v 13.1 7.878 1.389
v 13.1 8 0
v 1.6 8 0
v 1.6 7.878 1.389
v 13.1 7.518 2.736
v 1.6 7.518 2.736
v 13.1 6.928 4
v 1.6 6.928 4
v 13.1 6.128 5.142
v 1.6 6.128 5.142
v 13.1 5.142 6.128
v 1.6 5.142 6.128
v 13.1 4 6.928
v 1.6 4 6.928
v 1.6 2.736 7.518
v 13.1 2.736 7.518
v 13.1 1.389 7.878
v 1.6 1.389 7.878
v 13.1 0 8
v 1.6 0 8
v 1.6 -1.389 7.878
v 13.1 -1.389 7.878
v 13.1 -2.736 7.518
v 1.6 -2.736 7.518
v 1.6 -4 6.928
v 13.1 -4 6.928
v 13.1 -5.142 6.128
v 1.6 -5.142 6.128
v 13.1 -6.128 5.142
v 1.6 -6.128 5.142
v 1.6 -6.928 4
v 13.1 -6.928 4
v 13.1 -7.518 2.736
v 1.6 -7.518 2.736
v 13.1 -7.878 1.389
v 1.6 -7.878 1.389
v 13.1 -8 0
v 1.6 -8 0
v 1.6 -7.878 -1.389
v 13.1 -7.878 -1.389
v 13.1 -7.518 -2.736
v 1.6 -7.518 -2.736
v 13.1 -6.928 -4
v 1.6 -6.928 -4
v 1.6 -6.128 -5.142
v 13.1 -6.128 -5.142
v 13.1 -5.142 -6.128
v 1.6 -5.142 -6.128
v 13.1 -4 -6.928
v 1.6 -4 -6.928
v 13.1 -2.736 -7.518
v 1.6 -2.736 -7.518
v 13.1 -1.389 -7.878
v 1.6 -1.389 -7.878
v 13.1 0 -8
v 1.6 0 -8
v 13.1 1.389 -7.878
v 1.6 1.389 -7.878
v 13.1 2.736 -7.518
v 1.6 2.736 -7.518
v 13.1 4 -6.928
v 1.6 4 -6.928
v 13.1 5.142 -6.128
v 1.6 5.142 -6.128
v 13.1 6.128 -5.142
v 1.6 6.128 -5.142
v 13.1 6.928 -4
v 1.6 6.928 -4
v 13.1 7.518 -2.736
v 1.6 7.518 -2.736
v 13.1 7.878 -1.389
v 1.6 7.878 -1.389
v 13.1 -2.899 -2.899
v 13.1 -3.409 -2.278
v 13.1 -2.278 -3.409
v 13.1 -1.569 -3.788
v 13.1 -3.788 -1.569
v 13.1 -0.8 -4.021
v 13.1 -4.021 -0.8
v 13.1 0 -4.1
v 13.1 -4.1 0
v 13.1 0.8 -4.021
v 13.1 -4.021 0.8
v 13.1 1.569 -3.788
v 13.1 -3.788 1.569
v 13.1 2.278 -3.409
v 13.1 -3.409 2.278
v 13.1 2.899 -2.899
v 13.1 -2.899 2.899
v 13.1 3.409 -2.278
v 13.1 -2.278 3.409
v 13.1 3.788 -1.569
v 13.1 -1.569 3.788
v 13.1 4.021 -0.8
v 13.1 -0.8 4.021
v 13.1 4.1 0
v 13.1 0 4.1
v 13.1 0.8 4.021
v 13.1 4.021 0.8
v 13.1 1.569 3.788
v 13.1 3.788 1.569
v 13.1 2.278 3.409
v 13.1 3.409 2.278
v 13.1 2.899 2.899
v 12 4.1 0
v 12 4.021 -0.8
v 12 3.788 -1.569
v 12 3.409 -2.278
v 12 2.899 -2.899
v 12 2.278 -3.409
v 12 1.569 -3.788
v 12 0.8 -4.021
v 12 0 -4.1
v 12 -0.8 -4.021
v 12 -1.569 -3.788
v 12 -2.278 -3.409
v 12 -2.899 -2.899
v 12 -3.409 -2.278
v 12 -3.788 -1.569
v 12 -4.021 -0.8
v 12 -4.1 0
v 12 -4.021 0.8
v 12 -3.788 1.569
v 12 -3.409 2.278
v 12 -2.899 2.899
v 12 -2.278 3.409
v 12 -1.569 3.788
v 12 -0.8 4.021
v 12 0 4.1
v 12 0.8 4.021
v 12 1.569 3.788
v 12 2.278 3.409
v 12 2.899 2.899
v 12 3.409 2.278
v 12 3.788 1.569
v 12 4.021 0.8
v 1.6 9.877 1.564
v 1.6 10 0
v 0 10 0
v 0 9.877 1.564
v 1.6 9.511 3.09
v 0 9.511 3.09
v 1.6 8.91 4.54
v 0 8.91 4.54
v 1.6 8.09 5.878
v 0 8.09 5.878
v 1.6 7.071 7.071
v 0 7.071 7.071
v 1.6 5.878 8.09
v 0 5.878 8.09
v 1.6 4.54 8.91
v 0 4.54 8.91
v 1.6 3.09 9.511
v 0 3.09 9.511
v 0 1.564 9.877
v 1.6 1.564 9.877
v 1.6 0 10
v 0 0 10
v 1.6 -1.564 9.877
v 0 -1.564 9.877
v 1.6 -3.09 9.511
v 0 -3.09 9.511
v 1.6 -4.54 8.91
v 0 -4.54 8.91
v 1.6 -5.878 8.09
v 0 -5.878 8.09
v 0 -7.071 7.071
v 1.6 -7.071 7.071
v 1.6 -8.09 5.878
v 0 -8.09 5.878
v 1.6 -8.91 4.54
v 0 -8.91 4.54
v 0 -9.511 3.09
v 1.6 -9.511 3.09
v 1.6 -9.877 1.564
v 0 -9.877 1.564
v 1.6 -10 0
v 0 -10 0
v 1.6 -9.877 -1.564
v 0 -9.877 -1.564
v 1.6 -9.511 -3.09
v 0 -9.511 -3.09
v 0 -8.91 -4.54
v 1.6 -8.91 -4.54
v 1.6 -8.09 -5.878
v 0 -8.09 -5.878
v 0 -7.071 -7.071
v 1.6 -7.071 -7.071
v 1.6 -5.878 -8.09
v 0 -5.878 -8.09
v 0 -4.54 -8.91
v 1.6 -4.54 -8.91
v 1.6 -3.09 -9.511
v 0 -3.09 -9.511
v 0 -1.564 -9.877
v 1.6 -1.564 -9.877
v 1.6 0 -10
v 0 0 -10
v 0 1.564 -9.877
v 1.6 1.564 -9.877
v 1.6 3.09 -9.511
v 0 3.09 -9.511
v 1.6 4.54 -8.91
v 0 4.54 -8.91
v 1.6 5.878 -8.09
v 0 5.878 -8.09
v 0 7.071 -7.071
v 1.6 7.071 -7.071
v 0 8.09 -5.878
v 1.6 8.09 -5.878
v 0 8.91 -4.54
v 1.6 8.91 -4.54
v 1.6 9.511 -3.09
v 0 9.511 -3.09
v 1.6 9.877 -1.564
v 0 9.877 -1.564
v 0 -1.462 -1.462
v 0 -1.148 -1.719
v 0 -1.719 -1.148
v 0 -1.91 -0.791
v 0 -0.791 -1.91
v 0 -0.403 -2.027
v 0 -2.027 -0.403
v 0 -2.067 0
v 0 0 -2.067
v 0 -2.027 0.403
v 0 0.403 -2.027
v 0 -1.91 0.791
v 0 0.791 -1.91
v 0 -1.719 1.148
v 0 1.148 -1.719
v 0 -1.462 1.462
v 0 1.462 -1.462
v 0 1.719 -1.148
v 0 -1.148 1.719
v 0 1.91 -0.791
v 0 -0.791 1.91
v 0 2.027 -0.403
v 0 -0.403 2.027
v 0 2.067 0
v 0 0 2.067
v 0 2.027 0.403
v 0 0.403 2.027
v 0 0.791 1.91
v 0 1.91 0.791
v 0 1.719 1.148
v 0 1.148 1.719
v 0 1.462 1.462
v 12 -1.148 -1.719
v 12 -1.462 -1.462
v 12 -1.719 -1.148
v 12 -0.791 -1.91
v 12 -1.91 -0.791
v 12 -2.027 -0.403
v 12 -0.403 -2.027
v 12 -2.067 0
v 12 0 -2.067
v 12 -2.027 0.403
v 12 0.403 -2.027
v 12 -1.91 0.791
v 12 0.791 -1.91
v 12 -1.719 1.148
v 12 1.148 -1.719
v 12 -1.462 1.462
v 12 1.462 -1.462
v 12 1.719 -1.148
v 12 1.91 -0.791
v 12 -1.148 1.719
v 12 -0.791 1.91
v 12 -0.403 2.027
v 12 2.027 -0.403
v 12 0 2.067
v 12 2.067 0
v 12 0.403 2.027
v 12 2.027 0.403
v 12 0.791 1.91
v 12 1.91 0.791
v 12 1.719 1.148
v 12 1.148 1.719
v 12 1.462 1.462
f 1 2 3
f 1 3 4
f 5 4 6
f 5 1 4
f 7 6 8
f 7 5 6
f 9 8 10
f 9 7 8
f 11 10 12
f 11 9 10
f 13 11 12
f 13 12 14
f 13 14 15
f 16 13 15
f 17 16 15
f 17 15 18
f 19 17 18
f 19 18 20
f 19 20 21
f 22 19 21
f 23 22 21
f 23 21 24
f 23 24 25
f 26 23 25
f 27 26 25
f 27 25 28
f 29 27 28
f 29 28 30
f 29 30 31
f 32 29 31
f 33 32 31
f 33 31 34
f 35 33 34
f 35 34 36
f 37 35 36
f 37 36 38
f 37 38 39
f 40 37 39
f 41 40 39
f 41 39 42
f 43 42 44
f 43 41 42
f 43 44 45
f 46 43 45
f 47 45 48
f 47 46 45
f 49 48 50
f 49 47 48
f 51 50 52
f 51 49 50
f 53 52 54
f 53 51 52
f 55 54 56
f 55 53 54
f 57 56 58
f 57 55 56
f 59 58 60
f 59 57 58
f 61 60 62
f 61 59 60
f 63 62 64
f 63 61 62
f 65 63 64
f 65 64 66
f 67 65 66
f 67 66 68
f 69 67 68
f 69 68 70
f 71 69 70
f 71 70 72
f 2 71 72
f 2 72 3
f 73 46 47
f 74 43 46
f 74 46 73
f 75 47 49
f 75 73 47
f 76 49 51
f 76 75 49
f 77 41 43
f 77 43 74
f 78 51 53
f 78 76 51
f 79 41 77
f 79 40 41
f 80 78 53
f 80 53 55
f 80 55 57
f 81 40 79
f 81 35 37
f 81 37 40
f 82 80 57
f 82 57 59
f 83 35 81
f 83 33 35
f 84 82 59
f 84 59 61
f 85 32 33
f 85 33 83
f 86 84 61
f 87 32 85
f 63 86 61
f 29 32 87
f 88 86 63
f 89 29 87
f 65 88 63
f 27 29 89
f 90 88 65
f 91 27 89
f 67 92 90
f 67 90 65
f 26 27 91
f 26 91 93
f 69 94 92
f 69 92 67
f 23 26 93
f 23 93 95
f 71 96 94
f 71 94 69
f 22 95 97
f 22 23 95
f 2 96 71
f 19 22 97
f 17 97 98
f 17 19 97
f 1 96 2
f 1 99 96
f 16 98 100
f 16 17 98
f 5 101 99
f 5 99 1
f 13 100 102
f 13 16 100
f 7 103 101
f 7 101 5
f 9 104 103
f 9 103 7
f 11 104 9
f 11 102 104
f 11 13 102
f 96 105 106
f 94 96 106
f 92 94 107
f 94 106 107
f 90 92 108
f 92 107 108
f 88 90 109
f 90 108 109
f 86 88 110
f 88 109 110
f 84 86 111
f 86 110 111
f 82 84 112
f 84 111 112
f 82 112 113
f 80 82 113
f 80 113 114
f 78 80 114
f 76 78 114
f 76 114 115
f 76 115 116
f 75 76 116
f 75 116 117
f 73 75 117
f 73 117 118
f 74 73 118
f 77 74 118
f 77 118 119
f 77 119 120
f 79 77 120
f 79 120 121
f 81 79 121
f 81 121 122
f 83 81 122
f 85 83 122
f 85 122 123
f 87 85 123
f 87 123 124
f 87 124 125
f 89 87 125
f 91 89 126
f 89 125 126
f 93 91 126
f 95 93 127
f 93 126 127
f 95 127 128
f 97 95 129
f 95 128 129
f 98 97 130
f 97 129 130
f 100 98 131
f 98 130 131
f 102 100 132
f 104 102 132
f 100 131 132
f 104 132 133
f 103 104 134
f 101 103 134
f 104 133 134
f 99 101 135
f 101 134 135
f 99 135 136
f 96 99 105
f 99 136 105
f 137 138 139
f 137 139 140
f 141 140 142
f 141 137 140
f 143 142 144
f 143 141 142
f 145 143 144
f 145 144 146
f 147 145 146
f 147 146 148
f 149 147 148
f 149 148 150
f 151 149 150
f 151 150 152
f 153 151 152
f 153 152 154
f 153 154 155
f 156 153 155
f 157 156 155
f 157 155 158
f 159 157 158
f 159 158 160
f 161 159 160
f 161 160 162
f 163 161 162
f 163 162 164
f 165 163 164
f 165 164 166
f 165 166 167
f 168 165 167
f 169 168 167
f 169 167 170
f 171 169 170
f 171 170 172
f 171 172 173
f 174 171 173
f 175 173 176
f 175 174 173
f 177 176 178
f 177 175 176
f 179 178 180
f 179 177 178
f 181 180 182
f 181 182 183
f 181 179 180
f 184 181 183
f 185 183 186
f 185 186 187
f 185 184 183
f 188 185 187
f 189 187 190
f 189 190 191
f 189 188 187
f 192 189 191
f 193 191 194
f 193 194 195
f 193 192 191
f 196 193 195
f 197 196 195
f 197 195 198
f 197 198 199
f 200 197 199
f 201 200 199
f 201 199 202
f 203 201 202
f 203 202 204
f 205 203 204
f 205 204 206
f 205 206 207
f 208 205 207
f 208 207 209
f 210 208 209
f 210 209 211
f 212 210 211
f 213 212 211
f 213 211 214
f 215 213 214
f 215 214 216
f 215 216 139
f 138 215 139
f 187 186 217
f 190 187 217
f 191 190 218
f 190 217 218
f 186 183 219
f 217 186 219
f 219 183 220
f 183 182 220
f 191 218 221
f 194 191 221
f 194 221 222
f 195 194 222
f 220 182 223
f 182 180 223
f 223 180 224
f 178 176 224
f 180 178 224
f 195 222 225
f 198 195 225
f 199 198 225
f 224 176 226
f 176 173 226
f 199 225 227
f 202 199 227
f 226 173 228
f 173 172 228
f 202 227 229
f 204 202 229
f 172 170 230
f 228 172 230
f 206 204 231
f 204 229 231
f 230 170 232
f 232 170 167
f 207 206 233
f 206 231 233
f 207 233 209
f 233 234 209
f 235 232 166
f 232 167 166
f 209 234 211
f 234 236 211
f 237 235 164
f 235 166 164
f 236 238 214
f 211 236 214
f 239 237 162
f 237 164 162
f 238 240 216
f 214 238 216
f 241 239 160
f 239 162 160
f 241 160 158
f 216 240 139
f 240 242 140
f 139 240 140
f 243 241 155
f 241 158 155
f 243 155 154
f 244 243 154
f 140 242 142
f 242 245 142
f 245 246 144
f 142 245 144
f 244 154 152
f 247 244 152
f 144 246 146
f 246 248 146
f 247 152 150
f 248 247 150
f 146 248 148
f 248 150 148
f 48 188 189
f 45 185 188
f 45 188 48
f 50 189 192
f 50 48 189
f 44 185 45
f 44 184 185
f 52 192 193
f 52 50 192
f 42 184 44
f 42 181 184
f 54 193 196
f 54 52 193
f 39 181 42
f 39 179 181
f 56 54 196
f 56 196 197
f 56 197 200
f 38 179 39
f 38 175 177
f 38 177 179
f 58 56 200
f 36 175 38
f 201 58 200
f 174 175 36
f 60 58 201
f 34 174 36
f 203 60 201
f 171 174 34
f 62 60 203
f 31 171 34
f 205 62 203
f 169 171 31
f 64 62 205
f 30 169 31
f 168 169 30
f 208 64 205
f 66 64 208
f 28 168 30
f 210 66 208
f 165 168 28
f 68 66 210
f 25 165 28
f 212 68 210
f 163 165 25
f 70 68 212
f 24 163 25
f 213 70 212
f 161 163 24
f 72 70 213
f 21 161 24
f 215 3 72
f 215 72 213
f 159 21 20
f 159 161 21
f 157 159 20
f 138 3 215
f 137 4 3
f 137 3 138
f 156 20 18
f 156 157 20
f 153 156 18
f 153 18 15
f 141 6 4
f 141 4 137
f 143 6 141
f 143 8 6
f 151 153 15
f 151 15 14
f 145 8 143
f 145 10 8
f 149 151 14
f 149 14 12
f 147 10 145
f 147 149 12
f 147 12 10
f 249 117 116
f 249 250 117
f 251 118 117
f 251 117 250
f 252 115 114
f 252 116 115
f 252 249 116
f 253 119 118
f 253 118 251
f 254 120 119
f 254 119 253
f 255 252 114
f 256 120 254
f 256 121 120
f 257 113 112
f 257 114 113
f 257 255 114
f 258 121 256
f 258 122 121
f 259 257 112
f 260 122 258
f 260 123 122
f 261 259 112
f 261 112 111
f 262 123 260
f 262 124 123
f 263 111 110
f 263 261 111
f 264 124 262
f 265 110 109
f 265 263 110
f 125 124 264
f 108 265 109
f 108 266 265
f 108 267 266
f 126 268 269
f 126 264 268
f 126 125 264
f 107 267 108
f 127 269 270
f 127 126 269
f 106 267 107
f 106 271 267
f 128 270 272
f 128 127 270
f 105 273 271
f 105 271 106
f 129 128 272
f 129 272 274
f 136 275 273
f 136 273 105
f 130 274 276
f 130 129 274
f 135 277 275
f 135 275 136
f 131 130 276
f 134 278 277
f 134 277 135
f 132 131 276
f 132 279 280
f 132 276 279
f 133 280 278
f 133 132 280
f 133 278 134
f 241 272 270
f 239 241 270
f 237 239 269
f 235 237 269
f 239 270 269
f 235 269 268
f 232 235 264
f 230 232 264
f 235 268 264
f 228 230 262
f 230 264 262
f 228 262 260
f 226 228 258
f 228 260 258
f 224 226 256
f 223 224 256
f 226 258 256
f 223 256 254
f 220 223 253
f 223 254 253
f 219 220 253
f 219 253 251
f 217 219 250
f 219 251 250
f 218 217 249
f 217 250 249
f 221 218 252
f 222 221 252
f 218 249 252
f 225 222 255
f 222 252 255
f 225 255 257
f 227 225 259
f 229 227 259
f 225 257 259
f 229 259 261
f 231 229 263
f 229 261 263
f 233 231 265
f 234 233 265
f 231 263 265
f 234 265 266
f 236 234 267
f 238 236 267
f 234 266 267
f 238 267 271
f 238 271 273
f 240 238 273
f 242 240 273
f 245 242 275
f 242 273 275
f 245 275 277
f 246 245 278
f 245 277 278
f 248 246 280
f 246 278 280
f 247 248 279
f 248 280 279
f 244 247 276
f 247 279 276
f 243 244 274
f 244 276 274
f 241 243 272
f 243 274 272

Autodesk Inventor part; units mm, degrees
ref_plane "YZ Plane" through (0, 0, 0) normal (1, 0, 0) x (0, 1, 0)
ref_plane "XZ Plane" through (0, 0, 0) normal (0, 1, 0) x (-1, 0, 0)
ref_plane "XY Plane" through (0, 0, 0) normal (0, 0, 1) x (1, 0, 0)
sketch "Skizze1" plane through (0, 0, 0) normal (0, 0, 1) x (1, 0, 0)
  line L0 (0, 0) -> (0, 10)
  line L1 (0, 10) -> (1.6, 10)
  line L2 (1.6, 10) -> (1.6, 8)
  line L3 (1.6, 8) -> (13.1, 8)
  line L4 (13.1, 8) -> (13.1, 4)
  line L5 (0, 0) -> (12, 0)
  line L6 (13.1, 4) -> (12, 4)
  line L7 (12, 4) -> (12, 0)
  dimension "d0" = 16
  dimension "d1" = 20
  dimension "d2" = 11.5
  dimension "d3" = 1.6
  dimension "d12" = 8
  dimension "d13" = 10.4
revolve "Umdrehung1" add sketch "Skizze1" angle 360 about axis through (0, 0, 0) along (1, 0, 0)
sketch "Skizze2" plane through (0, 0, 0) normal (-1, 0, 0) x (0, 0, 1)
  point P0 (0, 0)
  point P1 (0, 0)
hole "Bohrung1" at (0, 0, 0) direction (1, 0, 0) diameter 4.134 depth 14.2 tip angle 118 thread size "M5x0.8" class "6H" standard "ISO Metric profile"
feature "Verdickung1" [suppressed]
thicken "Verdickung2" operation add thickness 0.1 both sides no extend neighbours yes toward (0, 0.9870503, -0.1604113) faces at (12.7333, 3.9482, -0.6416)
properties part number "SpringCompensation_Innside_SupportPart" material "PBT-Kunststoff"
